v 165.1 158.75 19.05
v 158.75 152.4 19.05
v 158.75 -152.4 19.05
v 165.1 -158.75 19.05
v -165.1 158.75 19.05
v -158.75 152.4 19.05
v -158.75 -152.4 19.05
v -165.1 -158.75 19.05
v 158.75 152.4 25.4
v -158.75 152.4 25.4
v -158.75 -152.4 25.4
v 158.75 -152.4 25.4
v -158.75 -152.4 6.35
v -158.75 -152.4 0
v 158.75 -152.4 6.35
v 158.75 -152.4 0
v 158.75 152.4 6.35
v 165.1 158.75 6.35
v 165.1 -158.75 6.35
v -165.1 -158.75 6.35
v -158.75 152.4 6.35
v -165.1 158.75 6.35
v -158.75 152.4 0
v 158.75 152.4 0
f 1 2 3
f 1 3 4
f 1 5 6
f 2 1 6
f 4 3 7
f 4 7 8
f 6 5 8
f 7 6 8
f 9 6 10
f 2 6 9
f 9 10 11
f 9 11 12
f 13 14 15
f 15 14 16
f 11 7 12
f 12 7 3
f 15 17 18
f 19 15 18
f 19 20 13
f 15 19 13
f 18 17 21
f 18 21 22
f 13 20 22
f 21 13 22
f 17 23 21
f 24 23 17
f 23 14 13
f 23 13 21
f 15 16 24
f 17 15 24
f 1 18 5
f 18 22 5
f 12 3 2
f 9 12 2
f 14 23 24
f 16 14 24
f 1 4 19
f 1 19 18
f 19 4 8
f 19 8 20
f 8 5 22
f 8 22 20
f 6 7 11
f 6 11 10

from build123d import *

# Parameters (mm, degrees)
F0_W     = 317.5
F0_H     = 304.8
F1_DEPTH = 25.4
F2_W     = 317.5
F2_H     = 12.7
F3_DEPTH = 6.35
F4_W     = 317.5
F4_H     = 12.7
F5_DEPTH = 6.35
F8_DEPTH = 6.35
F9_DEPTH = 6.35


with BuildPart() as f1:
    # F0 (on Top) → F1 (new body)
    with BuildSketch(Plane.XY):
        Rectangle(F0_W, F0_H)
    extrude(amount=F1_DEPTH)

    # F2 (on face) → F3 (join)
    with BuildSketch(Plane(origin=(0, 152.4, 0), x_dir=(-1, 0, 0), z_dir=(0, 1, 0))):
        with Locations((0, 12.7)):
            Rectangle(F2_W, F2_H)
    extrude(amount=F3_DEPTH)

    # F4 (on face) → F5 (join)
    with BuildSketch(Plane.XZ.offset(152.4)):
        with Locations((0, 12.7)):
            Rectangle(F4_W, F4_H)
    extrude(amount=F5_DEPTH)

    # F7 (on face) → F8 (join)
    with BuildSketch(Plane(origin=(-158.75, 0, 0), x_dir=(0, -1, 0), z_dir=(-1, 0, 0))):
        Polygon((-152.4, 19.05), (-158.75, 19.05), (-158.75, 6.35), (-152.4, 6.35), (152.4, 6.35), (158.75, 6.35), (158.75, 19.05), (152.4, 19.05), align=None)
    extrude(amount=F8_DEPTH)

    # F6 (on face) → F9 (join)
    with BuildSketch(Plane.YZ.offset(158.75)):
        Polygon((-152.4, 19.05), (-158.75, 19.05), (-158.75, 6.35), (-152.4, 6.35), (152.4, 6.35), (158.75, 6.35), (158.75, 19.05), (152.4, 19.05), align=None)
    extrude(amount=F9_DEPTH)


solid = f1.part
